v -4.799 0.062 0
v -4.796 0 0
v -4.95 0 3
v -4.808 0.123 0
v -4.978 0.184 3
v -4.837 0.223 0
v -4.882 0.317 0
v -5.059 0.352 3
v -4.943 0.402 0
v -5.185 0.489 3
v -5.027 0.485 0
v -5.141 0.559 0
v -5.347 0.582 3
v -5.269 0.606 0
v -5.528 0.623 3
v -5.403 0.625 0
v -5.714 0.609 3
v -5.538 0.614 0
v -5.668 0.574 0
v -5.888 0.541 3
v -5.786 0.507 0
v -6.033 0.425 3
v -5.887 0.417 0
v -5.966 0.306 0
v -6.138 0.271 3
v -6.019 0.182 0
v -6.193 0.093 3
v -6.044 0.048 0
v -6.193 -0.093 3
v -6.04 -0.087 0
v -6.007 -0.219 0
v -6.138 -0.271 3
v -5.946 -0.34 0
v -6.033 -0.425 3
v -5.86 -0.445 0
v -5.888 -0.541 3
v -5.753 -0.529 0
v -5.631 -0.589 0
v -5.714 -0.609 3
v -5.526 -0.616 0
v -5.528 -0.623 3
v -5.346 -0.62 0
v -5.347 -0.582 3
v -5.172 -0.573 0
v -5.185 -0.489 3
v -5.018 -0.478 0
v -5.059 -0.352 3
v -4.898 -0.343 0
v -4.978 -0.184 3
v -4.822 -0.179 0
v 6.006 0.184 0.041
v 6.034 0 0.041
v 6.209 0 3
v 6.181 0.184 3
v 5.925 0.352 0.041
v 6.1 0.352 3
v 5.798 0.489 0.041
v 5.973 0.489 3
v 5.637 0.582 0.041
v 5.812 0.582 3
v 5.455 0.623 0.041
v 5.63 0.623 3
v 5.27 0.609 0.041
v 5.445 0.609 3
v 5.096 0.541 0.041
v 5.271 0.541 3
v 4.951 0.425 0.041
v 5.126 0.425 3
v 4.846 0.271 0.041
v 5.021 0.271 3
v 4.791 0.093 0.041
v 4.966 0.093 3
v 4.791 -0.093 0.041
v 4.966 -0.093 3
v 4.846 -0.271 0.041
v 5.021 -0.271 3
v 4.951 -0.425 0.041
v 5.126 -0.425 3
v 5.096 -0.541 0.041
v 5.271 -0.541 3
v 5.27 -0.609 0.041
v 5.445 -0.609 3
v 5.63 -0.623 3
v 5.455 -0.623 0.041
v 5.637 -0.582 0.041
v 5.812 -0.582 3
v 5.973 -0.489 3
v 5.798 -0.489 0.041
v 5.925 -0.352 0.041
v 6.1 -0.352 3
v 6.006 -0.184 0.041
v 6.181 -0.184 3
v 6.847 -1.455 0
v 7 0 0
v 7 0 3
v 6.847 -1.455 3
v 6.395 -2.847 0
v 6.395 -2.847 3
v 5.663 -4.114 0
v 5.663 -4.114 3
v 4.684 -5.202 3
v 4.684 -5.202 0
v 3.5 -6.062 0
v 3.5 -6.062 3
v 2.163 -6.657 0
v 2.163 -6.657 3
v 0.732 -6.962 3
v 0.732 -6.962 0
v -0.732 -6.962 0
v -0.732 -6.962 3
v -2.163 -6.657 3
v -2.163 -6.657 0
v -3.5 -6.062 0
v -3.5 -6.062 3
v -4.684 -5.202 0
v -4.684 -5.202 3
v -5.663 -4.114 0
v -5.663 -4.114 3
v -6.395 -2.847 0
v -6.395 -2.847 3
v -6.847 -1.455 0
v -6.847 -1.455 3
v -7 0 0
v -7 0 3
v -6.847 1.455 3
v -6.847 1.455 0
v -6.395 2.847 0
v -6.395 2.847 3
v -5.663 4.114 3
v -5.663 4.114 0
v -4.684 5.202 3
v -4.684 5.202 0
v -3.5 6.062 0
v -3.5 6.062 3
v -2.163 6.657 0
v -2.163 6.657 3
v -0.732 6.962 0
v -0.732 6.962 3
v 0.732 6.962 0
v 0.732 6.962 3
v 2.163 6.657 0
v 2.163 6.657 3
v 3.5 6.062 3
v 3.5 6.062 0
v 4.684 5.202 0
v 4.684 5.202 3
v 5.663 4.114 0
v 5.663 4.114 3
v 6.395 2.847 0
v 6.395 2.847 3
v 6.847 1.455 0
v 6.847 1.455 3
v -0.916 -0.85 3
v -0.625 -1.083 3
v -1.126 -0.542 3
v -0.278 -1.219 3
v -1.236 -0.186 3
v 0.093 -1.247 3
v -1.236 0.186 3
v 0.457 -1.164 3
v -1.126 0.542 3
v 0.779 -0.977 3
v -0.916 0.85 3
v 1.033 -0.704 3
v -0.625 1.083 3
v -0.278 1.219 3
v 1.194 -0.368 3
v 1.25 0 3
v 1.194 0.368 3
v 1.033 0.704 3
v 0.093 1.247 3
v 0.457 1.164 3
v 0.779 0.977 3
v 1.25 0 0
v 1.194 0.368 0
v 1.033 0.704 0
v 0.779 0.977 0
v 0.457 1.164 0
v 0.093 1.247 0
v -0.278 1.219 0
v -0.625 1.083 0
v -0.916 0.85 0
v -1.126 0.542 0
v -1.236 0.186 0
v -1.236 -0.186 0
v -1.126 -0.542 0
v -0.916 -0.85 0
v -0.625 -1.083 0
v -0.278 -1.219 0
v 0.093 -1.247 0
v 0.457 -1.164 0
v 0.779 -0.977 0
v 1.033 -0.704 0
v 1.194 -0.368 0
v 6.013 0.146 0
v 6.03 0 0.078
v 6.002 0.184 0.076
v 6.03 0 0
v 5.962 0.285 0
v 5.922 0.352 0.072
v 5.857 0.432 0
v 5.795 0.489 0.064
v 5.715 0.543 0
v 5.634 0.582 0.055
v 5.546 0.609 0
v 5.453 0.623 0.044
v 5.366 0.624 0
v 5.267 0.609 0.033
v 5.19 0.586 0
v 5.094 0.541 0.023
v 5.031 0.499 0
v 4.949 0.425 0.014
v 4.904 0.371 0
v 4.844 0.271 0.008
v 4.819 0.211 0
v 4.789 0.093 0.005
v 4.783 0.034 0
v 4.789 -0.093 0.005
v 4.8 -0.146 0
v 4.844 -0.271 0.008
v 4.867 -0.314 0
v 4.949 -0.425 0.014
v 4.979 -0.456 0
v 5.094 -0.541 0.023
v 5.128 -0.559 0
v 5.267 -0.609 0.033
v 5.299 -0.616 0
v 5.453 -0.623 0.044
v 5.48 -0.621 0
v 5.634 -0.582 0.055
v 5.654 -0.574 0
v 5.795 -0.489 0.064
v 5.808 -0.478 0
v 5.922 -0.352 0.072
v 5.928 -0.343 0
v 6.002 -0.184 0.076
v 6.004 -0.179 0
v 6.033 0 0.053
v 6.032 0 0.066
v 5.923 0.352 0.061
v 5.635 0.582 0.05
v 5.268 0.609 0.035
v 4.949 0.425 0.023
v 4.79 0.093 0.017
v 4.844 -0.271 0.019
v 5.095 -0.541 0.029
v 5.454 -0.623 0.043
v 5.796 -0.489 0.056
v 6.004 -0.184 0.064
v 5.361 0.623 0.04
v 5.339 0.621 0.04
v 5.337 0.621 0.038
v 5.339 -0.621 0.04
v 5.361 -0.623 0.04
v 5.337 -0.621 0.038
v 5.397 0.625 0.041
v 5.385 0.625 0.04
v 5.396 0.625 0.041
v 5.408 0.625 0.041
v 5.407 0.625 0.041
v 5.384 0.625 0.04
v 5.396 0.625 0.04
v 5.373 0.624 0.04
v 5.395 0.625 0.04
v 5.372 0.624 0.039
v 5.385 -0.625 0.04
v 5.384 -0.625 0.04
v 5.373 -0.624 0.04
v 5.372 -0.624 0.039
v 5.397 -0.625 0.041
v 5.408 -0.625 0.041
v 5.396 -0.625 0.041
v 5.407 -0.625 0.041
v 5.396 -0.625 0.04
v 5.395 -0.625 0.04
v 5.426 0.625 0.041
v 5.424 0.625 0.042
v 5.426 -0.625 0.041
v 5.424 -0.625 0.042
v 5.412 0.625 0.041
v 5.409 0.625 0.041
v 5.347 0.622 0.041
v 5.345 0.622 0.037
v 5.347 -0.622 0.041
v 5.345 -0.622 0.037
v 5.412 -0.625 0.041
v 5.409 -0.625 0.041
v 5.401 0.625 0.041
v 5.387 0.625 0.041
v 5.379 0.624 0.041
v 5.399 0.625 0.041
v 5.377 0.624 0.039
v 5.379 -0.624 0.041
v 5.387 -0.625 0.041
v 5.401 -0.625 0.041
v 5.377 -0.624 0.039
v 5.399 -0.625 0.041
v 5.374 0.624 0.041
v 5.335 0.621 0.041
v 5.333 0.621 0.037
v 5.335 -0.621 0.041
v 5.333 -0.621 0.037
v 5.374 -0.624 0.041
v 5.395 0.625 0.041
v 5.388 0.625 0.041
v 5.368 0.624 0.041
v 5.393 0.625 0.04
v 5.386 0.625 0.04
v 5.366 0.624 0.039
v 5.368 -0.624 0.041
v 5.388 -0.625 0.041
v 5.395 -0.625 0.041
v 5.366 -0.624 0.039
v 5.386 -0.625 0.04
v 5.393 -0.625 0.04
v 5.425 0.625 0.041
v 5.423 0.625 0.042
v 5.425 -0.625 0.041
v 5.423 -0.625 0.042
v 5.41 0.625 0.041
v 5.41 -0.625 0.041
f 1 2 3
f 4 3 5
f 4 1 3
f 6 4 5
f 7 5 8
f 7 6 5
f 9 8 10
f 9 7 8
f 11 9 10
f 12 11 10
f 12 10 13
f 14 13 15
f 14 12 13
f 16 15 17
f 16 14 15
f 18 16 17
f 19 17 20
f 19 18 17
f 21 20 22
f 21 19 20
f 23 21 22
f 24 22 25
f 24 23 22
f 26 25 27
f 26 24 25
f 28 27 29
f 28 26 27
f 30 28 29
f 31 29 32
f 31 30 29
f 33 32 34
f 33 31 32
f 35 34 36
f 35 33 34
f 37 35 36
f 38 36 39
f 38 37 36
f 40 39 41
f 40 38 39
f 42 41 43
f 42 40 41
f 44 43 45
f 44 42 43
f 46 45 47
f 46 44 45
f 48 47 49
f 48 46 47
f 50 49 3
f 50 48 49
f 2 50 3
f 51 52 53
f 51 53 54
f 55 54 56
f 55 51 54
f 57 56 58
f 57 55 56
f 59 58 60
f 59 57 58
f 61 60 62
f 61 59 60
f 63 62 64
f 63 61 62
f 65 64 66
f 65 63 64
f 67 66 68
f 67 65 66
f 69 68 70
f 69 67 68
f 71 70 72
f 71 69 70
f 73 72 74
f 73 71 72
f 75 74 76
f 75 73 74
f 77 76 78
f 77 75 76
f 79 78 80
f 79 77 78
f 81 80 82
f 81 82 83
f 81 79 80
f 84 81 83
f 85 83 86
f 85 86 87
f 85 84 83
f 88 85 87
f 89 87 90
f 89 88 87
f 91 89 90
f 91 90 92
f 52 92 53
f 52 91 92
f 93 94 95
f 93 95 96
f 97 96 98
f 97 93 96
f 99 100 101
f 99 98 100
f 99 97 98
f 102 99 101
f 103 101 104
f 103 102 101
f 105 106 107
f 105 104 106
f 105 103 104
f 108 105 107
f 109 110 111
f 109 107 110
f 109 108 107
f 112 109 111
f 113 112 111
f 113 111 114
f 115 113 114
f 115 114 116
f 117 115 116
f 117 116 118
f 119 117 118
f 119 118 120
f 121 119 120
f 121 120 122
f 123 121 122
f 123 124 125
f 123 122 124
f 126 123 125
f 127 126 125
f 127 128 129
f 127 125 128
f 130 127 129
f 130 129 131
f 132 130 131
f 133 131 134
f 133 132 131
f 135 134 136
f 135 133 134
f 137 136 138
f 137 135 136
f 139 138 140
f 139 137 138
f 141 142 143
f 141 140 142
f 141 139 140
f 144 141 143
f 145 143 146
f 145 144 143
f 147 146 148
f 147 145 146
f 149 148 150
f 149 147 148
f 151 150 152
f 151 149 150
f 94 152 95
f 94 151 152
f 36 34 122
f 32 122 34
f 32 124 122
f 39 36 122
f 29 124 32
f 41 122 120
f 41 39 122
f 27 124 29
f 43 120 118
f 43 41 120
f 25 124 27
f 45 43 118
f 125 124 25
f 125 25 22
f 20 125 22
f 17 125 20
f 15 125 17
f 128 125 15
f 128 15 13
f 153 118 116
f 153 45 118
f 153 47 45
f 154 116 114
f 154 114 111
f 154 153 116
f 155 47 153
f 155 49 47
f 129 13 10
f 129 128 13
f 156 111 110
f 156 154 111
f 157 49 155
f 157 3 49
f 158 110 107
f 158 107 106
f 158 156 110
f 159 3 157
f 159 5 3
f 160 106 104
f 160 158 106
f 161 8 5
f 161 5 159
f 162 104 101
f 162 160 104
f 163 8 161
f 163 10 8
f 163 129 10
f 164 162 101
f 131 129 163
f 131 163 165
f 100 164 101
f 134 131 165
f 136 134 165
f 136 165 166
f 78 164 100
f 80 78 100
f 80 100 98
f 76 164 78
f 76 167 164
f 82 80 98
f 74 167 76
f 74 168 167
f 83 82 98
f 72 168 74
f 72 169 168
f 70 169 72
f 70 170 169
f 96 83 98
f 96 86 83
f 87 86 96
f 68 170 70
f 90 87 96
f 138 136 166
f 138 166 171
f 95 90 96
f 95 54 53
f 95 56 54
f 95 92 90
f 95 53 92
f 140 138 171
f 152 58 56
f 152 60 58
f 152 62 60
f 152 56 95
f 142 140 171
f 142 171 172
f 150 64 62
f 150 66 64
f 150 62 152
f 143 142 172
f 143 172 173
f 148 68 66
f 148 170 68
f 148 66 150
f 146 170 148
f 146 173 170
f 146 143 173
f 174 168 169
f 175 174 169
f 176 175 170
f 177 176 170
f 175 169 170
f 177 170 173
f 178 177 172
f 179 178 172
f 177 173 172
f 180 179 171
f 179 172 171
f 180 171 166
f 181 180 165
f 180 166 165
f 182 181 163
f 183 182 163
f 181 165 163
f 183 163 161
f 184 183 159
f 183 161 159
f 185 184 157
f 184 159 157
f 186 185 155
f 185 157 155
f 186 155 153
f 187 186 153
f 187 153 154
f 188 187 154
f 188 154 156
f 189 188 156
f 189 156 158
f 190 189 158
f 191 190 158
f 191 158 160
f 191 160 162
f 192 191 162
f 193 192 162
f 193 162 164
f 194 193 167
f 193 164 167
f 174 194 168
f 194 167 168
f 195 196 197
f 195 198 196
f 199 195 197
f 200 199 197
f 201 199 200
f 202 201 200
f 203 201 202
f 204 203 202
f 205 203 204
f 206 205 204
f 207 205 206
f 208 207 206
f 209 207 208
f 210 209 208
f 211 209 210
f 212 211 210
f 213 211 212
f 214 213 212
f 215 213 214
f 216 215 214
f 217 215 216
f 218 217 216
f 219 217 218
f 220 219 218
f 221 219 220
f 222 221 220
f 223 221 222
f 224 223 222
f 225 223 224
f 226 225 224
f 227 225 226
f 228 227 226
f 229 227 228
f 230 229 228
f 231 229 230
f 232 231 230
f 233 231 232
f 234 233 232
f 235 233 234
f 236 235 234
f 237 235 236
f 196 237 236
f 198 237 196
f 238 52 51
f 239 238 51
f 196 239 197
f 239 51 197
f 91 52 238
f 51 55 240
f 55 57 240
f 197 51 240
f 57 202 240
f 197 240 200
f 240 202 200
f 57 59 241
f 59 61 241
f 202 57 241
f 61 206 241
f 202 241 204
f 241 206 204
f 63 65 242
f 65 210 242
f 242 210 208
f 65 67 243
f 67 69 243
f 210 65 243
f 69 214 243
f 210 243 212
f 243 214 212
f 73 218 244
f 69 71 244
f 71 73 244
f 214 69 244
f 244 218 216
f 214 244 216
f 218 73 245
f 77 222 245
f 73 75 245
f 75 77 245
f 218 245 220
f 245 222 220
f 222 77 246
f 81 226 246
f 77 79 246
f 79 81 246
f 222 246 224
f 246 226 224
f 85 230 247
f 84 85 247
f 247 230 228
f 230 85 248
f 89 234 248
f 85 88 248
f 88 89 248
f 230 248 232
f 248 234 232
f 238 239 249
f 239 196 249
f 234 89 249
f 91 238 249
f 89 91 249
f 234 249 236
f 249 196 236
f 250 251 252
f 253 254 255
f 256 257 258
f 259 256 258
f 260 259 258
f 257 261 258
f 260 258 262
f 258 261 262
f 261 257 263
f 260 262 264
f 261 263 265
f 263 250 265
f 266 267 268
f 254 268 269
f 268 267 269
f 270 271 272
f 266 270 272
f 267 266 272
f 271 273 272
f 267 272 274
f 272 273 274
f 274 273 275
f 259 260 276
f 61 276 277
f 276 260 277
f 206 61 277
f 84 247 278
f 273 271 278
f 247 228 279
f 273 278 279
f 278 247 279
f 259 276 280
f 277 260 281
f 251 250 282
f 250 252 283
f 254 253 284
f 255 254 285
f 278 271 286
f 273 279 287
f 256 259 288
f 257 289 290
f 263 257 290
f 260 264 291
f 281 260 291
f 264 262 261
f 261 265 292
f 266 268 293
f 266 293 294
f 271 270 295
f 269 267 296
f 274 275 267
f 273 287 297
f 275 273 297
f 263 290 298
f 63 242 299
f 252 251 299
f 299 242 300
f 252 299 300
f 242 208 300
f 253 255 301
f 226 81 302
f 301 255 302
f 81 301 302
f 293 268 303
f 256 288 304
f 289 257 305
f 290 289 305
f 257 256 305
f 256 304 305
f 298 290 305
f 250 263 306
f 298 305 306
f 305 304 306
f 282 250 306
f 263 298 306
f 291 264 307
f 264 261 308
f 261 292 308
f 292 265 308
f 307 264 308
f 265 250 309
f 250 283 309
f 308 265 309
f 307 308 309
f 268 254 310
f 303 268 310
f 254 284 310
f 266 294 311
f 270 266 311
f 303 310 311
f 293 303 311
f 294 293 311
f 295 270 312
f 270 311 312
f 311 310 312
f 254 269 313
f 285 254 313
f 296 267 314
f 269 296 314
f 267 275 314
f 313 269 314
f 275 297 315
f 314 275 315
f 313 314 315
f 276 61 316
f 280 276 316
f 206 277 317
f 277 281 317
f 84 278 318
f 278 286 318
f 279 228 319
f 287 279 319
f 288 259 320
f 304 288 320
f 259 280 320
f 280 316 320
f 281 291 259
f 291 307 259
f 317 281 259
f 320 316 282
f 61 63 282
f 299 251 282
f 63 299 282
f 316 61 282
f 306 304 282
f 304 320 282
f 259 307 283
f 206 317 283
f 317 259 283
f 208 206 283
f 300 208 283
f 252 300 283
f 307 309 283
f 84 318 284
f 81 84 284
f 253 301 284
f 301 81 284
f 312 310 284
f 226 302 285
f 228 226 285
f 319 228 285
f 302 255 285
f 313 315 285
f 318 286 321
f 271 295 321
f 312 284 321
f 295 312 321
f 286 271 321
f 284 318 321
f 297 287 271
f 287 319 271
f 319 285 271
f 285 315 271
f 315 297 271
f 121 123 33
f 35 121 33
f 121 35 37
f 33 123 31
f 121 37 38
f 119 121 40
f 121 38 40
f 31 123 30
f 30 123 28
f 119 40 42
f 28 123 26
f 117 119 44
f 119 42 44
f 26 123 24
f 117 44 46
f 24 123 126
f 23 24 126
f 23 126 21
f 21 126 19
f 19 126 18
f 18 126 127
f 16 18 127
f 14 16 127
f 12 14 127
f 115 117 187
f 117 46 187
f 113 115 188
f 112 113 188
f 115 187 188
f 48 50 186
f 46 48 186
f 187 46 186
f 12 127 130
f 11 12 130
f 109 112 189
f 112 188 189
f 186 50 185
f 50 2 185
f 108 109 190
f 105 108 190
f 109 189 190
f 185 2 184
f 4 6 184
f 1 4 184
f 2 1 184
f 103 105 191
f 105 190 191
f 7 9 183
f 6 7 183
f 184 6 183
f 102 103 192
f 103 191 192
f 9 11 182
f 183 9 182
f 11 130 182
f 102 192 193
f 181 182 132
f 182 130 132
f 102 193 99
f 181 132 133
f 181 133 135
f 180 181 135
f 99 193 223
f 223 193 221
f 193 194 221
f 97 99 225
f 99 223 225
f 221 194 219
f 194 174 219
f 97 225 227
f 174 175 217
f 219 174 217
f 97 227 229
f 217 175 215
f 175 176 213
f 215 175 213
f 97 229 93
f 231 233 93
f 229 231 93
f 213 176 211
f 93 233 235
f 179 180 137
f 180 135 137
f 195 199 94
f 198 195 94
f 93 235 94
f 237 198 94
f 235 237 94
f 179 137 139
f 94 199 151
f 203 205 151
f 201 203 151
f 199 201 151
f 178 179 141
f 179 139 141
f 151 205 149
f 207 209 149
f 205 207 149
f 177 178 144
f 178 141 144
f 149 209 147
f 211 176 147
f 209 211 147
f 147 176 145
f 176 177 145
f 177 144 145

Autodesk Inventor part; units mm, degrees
ref_plane "YZ Plane" through (0, 0, 0) normal (1, 0, 0) x (0, 1, 0)
ref_plane "XZ Plane" through (0, 0, 0) normal (0, 1, 0) x (-1, 0, 0)
ref_plane "XY Plane" through (0, 0, 0) normal (0, 0, 1) x (1, 0, 0)
sketch "Sketch1" plane through (0, 0, 0) normal (0, 0, 1) x (1, 0, 0)
  circle A0 centre (0, 0) radius 7
  dimension "d0" = 14
extrude "Extrusion1" add sketch "Sketch1" along normal blind 3
sketch "Sketch2" plane through (0, 0, 3) normal (0, 0, 1) x (1, 0, 0)
  circle A0 centre (0, 0) radius 1.25
  dimension "d3" = 2.5
extrude "Extrusion2" cut sketch "Sketch2" against normal blind 3
sketch "Sketch3" plane through (0, 0, 3) normal (0, 0, 1) x (1, 0, 0)
  circle A0 centre (-5.575, 0) radius 0.625
  circle A1 centre (0, 0) radius 7 projected
  circle A2 centre (5.575, 0) radius 0.625
  dimension "d6" = 1.25
  dimension "d7" = 1.25
  dimension "d9" = 0.8
  dimension "d10" = 0.8
  dimension "d12" = 9.9
sketch "Sketch4" plane through (0, 0, 0) normal (0, 1, 0) x (-1, 0, 0)
  line L0 (7, 3) -> (-7, 3) projected
  line L1 (5.5663, 3) -> (5.4, -0.2434)
  line L2 (7, 0) -> (7, 3) projected
  point P0 (0, 0)
  dimension "d13" = 1.6
sweep "Sweep1" cut profiles "Sketch3" path "Sketch4" path curves L1 contours A0
sketch "Sketch5" plane through (0, 0, 3) normal (0, 0, 1) x (1, 0, 0)
  circle A0 centre (5.5837, 0) radius 0.625
  circle A1 centre (-5.5663, 0) radius 0.625 projected
  point P0 (0, 0)
  dimension "d16" = 1.25
  dimension "d17" = 9.9
sketch "Sketch6" plane through (0, 0, 0) normal (0, 1, 0) x (-1, 0, 0)
  line L0 (-5.575, 2.9594) -> (-5.4, 0)
  line L1 (-7, 0) -> (7, 0) projected
  line L2 (-7, 0) -> (-7, 3) projected
  line L3 (-5.4, 0) -> (-5.4, -0.6456)
  point P0 (0, 0)
  dimension "d18" = 1.425
  dimension "d19" = 1.6
sweep "Sweep2" cut profiles "Sketch5" path "Sketch6" path curves L0 L3 contours A0
properties part number "MUSAB6" material "Bronze"
